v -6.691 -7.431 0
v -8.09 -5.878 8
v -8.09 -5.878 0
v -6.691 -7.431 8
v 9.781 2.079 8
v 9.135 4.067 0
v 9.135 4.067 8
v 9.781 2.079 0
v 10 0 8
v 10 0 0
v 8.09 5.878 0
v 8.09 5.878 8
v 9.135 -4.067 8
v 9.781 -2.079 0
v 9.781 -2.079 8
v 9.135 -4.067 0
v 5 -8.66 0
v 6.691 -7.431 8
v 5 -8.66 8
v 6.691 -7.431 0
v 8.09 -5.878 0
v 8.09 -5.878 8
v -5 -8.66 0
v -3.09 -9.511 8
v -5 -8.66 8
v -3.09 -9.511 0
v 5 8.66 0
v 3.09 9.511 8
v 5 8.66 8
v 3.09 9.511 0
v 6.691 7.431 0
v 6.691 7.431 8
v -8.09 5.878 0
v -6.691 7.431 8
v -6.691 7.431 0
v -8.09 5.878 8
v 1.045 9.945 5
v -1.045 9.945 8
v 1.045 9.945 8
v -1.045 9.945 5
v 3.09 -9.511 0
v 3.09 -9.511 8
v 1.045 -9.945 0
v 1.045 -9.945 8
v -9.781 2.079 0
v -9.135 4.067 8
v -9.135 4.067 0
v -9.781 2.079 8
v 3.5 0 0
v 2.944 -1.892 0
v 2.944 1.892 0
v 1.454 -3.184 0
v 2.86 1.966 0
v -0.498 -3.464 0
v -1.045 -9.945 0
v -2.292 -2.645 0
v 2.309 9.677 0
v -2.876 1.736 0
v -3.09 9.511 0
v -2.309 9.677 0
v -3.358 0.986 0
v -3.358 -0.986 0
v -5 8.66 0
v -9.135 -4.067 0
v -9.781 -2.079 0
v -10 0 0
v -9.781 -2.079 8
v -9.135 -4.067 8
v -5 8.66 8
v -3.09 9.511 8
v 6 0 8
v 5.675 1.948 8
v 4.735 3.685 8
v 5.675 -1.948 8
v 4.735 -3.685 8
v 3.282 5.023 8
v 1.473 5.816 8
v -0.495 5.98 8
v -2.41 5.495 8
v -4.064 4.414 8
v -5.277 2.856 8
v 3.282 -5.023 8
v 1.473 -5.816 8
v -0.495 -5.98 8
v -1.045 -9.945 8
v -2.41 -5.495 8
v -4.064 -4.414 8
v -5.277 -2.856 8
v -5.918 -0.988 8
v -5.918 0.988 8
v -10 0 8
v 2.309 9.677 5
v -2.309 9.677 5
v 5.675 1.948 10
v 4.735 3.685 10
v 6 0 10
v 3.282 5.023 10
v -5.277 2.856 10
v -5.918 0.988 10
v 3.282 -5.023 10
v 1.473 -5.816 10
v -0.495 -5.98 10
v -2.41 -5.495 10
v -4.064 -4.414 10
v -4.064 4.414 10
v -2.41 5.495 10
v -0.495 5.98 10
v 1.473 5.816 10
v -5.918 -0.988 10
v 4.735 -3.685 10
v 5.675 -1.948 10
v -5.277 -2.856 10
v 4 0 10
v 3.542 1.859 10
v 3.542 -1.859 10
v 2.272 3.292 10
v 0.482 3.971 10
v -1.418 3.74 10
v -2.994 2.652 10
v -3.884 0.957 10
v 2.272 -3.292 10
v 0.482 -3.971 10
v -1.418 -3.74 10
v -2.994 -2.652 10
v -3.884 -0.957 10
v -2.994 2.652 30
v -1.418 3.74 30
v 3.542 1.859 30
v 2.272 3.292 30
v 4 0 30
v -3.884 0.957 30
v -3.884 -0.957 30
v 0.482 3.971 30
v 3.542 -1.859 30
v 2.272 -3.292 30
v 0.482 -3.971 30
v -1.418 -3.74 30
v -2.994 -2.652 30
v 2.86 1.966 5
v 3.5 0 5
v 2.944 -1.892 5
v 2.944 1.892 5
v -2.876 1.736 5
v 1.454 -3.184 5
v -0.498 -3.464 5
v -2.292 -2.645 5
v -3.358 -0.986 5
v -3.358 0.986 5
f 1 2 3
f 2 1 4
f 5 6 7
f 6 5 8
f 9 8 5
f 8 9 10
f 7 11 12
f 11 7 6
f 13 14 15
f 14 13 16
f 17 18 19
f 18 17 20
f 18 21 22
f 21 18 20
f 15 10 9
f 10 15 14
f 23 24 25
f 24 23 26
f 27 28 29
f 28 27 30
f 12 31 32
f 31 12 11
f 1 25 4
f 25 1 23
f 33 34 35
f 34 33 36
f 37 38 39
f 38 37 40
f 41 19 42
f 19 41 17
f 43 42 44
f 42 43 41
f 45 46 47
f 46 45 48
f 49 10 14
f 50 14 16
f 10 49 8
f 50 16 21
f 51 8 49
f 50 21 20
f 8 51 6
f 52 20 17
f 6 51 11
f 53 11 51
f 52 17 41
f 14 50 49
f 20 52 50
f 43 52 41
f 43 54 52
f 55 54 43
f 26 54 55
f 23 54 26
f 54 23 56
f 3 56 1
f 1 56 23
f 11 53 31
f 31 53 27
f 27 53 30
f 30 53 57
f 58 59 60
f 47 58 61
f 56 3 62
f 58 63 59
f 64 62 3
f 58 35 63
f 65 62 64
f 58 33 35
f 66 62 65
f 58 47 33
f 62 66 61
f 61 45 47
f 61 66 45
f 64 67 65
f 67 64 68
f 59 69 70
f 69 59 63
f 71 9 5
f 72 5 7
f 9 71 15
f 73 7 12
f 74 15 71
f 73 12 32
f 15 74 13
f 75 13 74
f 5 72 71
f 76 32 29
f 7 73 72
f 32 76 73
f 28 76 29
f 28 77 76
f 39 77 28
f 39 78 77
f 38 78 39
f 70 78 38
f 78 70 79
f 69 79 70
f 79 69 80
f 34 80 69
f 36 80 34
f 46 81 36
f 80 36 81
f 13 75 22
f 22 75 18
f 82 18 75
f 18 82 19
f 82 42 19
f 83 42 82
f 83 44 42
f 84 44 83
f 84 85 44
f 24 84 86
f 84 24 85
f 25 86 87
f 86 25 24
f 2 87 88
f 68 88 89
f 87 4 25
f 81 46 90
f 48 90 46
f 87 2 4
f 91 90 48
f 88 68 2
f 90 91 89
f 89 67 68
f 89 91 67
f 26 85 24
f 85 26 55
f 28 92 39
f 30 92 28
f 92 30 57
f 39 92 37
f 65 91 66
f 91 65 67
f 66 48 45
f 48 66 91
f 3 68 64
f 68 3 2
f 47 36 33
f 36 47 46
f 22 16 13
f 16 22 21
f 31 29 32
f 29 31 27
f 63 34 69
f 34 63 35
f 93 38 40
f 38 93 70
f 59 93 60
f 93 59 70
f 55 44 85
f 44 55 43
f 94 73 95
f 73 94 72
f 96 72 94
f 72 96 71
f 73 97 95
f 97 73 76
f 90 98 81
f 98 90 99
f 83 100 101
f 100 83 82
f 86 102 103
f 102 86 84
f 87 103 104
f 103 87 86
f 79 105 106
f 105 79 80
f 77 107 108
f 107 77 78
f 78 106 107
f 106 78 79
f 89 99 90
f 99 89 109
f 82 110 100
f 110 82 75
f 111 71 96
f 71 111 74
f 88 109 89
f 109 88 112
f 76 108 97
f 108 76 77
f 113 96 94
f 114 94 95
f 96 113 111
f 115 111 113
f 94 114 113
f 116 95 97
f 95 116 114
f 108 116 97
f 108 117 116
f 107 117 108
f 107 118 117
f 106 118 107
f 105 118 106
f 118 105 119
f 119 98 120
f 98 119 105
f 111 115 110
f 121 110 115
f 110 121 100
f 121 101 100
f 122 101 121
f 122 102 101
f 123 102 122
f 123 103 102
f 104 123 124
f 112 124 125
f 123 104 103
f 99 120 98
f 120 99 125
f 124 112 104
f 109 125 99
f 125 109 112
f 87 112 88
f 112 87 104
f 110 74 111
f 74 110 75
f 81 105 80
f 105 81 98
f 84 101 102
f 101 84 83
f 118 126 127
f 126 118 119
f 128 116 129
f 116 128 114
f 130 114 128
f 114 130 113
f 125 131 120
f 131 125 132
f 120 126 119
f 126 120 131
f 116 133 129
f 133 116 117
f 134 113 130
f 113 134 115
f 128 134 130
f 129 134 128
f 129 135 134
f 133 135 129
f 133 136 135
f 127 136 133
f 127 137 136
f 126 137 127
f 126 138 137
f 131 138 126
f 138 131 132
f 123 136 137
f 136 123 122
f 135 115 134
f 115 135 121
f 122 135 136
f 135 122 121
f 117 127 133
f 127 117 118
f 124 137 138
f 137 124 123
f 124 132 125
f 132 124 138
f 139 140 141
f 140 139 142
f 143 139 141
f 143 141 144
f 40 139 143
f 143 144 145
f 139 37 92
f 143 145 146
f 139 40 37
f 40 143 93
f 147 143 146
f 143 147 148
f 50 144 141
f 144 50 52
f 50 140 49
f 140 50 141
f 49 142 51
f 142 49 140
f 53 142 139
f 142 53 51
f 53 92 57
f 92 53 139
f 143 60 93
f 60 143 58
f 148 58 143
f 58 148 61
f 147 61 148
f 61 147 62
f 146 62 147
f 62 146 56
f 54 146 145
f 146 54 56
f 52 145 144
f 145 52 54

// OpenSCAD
difference() {
	union() {
		union() {
			cylinder(h = 8, r = 10);
			cylinder(h = 10, r = 6);
		}
		cylinder(h = 30, r = 4);
	}
	linear_extrude(height = 5) {
		circle(d = 7);
		translate(v = [0, 14]) {
			circle(d = 4);
		}
		polygon(paths = [[0, 1, 2, 3]], points = [[3, 0], [2, 14], [-2, 14], [-3, 0]]);
	}
}
